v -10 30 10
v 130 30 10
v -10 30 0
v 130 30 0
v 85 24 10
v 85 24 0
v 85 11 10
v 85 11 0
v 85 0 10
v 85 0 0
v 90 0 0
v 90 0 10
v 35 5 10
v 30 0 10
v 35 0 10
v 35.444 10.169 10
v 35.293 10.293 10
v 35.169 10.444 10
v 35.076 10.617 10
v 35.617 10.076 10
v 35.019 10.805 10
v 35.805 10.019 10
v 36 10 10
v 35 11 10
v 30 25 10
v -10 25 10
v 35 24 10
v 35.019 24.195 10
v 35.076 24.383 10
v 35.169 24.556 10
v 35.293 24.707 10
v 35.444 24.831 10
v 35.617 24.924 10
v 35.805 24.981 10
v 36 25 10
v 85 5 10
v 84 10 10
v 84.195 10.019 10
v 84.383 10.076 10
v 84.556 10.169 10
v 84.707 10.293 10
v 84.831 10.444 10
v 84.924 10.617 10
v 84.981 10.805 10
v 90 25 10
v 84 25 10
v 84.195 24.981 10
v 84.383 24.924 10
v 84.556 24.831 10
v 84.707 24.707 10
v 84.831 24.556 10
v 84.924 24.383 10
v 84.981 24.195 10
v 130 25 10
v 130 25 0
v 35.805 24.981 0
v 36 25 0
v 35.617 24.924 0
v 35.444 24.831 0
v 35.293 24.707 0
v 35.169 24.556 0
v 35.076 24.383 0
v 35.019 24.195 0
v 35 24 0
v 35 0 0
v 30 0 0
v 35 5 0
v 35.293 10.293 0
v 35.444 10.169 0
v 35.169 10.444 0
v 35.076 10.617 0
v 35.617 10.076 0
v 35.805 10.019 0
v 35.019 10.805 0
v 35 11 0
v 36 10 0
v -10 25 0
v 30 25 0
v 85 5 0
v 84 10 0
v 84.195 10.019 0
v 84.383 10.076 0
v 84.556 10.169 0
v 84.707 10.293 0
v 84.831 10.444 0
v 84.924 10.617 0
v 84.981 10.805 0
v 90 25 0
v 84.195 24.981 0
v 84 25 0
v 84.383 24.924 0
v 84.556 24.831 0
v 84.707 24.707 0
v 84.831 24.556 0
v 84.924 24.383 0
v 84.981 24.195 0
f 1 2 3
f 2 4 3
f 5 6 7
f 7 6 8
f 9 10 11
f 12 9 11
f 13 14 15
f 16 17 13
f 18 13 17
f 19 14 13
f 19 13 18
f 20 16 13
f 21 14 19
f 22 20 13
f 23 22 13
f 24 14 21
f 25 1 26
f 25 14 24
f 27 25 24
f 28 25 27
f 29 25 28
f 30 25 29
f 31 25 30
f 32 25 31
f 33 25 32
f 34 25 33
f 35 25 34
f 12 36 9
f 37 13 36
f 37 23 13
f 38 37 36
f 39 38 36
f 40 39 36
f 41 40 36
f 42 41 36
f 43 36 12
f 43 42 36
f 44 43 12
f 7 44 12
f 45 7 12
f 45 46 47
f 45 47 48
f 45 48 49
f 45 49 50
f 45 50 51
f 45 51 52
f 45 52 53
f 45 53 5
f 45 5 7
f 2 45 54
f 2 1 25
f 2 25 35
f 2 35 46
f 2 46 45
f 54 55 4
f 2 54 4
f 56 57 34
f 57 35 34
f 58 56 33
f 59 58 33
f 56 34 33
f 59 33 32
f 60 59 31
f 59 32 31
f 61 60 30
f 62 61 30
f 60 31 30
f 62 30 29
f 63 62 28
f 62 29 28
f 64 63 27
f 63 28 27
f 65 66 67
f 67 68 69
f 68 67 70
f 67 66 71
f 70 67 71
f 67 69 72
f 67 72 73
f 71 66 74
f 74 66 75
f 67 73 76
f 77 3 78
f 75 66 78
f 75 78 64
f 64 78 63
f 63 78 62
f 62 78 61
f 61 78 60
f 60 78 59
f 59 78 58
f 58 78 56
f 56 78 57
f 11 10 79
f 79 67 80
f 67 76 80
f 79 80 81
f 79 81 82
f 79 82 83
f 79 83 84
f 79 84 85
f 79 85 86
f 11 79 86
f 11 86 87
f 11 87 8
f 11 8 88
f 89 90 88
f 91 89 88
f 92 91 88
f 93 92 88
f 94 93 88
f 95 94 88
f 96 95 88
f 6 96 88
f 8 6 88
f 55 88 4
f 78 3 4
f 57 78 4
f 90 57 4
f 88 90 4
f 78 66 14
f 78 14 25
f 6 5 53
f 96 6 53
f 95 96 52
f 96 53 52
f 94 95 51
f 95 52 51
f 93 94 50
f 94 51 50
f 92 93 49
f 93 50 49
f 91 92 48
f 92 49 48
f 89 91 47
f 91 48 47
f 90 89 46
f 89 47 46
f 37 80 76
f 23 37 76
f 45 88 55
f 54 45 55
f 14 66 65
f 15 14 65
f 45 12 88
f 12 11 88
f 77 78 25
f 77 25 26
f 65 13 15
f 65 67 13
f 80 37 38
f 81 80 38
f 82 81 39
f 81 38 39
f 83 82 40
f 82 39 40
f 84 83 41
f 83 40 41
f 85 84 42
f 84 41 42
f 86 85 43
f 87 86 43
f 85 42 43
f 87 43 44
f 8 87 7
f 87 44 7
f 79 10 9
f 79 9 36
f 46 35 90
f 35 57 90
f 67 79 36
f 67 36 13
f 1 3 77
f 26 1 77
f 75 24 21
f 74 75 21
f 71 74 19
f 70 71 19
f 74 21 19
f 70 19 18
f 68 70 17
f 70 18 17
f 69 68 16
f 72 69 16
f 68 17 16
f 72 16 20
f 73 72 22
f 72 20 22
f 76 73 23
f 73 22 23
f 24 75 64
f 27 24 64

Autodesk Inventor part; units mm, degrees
ref_plane "YZ Plane" through (0, 0, 0) normal (1, 0, 0) x (0, 1, 0)
ref_plane "XZ Plane" through (0, 0, 0) normal (0, 1, 0) x (-1, 0, 0)
ref_plane "XY Plane" through (0, 0, 0) normal (0, 0, 1) x (1, 0, 0)
sketch "スケッチ1" plane through (0, 0, 0) normal (0, 0, 1) x (1, 0, 0)
  line L0 (130, 25) -> (130, 30)
  line L1 (130, 30) -> (-10, 30)
  line L2 (-10, 30) -> (-10, 25)
  line L3 (60, 30) -> (60, 0) construction
  line L4 (85, 0) -> (85, 5)
  line L5 (85, 5) -> (35, 5)
  line L6 (35, 5) -> (35, 0)
  line L7 (30, 0) -> (35, 0)
  line L8 (85, 0) -> (90, 0)
  line L9 (30, 0) -> (30, 25)
  line L10 (30, 25) -> (-10, 25)
  line L11 (90, 0) -> (90, 25)
  line L12 (90, 25) -> (130, 25)
  dimension "d2" = 50
  dimension "d4" = 5
  dimension "d5" = 5
  dimension "d6" = 5
  dimension "d7" = 140
  dimension "d8" = 30
extrude "押し出し1" add sketch "スケッチ1" along normal blind 10
sketch "スケッチ2" plane through (0, 0, 0) normal (0, 0, -1) x (-1, 0, 0)
  line L0 (-85, 10) -> (-35, 10)
  line L1 (-35, 10) -> (-35, 25)
  line L2 (-35, 25) -> (-85, 25)
  line L3 (-85, 25) -> (-85, 10)
  line L4 (-90, 0) -> (-90, 25) projected
  line L5 (-85, 0) -> (-90, 0) projected
  line L6 (-85, 5) -> (-85, 0) projected
  line L7 (-35, 5) -> (-85, 5) projected
  line L8 (-35, 0) -> (-35, 5) projected
  line L9 (-30, 0) -> (-35, 0) projected
  line L10 (-30, 25) -> (-30, 0) projected
  line L11 (10, 25) -> (-30, 25) projected
  line L12 (10, 30) -> (10, 25) projected
  line L13 (-130, 30) -> (10, 30) projected
  line L14 (-130, 25) -> (-130, 30) projected
  line L15 (-90, 25) -> (-130, 25) projected
  line L16 (-130, 30) -> (10, 30) projected
  line L17 (-60, 30) -> (-60, 5) construction
  line L18 (-35, 5) -> (-85, 5) projected
  point P0 (0, 0)
  dimension "d11" = 5
  dimension "d12" = 5
  dimension "d13" = 50
extrude "押し出し2" cut sketch "スケッチ2" against normal through all contours L3 L2 L1 L0
fillet "フィレット1" radius 1 4 edges at (85, 25, 5) (35, 25, 5) (35, 10, 5) (85, 10, 5)
properties part number "waist1." material "アルミニウム 6061"
